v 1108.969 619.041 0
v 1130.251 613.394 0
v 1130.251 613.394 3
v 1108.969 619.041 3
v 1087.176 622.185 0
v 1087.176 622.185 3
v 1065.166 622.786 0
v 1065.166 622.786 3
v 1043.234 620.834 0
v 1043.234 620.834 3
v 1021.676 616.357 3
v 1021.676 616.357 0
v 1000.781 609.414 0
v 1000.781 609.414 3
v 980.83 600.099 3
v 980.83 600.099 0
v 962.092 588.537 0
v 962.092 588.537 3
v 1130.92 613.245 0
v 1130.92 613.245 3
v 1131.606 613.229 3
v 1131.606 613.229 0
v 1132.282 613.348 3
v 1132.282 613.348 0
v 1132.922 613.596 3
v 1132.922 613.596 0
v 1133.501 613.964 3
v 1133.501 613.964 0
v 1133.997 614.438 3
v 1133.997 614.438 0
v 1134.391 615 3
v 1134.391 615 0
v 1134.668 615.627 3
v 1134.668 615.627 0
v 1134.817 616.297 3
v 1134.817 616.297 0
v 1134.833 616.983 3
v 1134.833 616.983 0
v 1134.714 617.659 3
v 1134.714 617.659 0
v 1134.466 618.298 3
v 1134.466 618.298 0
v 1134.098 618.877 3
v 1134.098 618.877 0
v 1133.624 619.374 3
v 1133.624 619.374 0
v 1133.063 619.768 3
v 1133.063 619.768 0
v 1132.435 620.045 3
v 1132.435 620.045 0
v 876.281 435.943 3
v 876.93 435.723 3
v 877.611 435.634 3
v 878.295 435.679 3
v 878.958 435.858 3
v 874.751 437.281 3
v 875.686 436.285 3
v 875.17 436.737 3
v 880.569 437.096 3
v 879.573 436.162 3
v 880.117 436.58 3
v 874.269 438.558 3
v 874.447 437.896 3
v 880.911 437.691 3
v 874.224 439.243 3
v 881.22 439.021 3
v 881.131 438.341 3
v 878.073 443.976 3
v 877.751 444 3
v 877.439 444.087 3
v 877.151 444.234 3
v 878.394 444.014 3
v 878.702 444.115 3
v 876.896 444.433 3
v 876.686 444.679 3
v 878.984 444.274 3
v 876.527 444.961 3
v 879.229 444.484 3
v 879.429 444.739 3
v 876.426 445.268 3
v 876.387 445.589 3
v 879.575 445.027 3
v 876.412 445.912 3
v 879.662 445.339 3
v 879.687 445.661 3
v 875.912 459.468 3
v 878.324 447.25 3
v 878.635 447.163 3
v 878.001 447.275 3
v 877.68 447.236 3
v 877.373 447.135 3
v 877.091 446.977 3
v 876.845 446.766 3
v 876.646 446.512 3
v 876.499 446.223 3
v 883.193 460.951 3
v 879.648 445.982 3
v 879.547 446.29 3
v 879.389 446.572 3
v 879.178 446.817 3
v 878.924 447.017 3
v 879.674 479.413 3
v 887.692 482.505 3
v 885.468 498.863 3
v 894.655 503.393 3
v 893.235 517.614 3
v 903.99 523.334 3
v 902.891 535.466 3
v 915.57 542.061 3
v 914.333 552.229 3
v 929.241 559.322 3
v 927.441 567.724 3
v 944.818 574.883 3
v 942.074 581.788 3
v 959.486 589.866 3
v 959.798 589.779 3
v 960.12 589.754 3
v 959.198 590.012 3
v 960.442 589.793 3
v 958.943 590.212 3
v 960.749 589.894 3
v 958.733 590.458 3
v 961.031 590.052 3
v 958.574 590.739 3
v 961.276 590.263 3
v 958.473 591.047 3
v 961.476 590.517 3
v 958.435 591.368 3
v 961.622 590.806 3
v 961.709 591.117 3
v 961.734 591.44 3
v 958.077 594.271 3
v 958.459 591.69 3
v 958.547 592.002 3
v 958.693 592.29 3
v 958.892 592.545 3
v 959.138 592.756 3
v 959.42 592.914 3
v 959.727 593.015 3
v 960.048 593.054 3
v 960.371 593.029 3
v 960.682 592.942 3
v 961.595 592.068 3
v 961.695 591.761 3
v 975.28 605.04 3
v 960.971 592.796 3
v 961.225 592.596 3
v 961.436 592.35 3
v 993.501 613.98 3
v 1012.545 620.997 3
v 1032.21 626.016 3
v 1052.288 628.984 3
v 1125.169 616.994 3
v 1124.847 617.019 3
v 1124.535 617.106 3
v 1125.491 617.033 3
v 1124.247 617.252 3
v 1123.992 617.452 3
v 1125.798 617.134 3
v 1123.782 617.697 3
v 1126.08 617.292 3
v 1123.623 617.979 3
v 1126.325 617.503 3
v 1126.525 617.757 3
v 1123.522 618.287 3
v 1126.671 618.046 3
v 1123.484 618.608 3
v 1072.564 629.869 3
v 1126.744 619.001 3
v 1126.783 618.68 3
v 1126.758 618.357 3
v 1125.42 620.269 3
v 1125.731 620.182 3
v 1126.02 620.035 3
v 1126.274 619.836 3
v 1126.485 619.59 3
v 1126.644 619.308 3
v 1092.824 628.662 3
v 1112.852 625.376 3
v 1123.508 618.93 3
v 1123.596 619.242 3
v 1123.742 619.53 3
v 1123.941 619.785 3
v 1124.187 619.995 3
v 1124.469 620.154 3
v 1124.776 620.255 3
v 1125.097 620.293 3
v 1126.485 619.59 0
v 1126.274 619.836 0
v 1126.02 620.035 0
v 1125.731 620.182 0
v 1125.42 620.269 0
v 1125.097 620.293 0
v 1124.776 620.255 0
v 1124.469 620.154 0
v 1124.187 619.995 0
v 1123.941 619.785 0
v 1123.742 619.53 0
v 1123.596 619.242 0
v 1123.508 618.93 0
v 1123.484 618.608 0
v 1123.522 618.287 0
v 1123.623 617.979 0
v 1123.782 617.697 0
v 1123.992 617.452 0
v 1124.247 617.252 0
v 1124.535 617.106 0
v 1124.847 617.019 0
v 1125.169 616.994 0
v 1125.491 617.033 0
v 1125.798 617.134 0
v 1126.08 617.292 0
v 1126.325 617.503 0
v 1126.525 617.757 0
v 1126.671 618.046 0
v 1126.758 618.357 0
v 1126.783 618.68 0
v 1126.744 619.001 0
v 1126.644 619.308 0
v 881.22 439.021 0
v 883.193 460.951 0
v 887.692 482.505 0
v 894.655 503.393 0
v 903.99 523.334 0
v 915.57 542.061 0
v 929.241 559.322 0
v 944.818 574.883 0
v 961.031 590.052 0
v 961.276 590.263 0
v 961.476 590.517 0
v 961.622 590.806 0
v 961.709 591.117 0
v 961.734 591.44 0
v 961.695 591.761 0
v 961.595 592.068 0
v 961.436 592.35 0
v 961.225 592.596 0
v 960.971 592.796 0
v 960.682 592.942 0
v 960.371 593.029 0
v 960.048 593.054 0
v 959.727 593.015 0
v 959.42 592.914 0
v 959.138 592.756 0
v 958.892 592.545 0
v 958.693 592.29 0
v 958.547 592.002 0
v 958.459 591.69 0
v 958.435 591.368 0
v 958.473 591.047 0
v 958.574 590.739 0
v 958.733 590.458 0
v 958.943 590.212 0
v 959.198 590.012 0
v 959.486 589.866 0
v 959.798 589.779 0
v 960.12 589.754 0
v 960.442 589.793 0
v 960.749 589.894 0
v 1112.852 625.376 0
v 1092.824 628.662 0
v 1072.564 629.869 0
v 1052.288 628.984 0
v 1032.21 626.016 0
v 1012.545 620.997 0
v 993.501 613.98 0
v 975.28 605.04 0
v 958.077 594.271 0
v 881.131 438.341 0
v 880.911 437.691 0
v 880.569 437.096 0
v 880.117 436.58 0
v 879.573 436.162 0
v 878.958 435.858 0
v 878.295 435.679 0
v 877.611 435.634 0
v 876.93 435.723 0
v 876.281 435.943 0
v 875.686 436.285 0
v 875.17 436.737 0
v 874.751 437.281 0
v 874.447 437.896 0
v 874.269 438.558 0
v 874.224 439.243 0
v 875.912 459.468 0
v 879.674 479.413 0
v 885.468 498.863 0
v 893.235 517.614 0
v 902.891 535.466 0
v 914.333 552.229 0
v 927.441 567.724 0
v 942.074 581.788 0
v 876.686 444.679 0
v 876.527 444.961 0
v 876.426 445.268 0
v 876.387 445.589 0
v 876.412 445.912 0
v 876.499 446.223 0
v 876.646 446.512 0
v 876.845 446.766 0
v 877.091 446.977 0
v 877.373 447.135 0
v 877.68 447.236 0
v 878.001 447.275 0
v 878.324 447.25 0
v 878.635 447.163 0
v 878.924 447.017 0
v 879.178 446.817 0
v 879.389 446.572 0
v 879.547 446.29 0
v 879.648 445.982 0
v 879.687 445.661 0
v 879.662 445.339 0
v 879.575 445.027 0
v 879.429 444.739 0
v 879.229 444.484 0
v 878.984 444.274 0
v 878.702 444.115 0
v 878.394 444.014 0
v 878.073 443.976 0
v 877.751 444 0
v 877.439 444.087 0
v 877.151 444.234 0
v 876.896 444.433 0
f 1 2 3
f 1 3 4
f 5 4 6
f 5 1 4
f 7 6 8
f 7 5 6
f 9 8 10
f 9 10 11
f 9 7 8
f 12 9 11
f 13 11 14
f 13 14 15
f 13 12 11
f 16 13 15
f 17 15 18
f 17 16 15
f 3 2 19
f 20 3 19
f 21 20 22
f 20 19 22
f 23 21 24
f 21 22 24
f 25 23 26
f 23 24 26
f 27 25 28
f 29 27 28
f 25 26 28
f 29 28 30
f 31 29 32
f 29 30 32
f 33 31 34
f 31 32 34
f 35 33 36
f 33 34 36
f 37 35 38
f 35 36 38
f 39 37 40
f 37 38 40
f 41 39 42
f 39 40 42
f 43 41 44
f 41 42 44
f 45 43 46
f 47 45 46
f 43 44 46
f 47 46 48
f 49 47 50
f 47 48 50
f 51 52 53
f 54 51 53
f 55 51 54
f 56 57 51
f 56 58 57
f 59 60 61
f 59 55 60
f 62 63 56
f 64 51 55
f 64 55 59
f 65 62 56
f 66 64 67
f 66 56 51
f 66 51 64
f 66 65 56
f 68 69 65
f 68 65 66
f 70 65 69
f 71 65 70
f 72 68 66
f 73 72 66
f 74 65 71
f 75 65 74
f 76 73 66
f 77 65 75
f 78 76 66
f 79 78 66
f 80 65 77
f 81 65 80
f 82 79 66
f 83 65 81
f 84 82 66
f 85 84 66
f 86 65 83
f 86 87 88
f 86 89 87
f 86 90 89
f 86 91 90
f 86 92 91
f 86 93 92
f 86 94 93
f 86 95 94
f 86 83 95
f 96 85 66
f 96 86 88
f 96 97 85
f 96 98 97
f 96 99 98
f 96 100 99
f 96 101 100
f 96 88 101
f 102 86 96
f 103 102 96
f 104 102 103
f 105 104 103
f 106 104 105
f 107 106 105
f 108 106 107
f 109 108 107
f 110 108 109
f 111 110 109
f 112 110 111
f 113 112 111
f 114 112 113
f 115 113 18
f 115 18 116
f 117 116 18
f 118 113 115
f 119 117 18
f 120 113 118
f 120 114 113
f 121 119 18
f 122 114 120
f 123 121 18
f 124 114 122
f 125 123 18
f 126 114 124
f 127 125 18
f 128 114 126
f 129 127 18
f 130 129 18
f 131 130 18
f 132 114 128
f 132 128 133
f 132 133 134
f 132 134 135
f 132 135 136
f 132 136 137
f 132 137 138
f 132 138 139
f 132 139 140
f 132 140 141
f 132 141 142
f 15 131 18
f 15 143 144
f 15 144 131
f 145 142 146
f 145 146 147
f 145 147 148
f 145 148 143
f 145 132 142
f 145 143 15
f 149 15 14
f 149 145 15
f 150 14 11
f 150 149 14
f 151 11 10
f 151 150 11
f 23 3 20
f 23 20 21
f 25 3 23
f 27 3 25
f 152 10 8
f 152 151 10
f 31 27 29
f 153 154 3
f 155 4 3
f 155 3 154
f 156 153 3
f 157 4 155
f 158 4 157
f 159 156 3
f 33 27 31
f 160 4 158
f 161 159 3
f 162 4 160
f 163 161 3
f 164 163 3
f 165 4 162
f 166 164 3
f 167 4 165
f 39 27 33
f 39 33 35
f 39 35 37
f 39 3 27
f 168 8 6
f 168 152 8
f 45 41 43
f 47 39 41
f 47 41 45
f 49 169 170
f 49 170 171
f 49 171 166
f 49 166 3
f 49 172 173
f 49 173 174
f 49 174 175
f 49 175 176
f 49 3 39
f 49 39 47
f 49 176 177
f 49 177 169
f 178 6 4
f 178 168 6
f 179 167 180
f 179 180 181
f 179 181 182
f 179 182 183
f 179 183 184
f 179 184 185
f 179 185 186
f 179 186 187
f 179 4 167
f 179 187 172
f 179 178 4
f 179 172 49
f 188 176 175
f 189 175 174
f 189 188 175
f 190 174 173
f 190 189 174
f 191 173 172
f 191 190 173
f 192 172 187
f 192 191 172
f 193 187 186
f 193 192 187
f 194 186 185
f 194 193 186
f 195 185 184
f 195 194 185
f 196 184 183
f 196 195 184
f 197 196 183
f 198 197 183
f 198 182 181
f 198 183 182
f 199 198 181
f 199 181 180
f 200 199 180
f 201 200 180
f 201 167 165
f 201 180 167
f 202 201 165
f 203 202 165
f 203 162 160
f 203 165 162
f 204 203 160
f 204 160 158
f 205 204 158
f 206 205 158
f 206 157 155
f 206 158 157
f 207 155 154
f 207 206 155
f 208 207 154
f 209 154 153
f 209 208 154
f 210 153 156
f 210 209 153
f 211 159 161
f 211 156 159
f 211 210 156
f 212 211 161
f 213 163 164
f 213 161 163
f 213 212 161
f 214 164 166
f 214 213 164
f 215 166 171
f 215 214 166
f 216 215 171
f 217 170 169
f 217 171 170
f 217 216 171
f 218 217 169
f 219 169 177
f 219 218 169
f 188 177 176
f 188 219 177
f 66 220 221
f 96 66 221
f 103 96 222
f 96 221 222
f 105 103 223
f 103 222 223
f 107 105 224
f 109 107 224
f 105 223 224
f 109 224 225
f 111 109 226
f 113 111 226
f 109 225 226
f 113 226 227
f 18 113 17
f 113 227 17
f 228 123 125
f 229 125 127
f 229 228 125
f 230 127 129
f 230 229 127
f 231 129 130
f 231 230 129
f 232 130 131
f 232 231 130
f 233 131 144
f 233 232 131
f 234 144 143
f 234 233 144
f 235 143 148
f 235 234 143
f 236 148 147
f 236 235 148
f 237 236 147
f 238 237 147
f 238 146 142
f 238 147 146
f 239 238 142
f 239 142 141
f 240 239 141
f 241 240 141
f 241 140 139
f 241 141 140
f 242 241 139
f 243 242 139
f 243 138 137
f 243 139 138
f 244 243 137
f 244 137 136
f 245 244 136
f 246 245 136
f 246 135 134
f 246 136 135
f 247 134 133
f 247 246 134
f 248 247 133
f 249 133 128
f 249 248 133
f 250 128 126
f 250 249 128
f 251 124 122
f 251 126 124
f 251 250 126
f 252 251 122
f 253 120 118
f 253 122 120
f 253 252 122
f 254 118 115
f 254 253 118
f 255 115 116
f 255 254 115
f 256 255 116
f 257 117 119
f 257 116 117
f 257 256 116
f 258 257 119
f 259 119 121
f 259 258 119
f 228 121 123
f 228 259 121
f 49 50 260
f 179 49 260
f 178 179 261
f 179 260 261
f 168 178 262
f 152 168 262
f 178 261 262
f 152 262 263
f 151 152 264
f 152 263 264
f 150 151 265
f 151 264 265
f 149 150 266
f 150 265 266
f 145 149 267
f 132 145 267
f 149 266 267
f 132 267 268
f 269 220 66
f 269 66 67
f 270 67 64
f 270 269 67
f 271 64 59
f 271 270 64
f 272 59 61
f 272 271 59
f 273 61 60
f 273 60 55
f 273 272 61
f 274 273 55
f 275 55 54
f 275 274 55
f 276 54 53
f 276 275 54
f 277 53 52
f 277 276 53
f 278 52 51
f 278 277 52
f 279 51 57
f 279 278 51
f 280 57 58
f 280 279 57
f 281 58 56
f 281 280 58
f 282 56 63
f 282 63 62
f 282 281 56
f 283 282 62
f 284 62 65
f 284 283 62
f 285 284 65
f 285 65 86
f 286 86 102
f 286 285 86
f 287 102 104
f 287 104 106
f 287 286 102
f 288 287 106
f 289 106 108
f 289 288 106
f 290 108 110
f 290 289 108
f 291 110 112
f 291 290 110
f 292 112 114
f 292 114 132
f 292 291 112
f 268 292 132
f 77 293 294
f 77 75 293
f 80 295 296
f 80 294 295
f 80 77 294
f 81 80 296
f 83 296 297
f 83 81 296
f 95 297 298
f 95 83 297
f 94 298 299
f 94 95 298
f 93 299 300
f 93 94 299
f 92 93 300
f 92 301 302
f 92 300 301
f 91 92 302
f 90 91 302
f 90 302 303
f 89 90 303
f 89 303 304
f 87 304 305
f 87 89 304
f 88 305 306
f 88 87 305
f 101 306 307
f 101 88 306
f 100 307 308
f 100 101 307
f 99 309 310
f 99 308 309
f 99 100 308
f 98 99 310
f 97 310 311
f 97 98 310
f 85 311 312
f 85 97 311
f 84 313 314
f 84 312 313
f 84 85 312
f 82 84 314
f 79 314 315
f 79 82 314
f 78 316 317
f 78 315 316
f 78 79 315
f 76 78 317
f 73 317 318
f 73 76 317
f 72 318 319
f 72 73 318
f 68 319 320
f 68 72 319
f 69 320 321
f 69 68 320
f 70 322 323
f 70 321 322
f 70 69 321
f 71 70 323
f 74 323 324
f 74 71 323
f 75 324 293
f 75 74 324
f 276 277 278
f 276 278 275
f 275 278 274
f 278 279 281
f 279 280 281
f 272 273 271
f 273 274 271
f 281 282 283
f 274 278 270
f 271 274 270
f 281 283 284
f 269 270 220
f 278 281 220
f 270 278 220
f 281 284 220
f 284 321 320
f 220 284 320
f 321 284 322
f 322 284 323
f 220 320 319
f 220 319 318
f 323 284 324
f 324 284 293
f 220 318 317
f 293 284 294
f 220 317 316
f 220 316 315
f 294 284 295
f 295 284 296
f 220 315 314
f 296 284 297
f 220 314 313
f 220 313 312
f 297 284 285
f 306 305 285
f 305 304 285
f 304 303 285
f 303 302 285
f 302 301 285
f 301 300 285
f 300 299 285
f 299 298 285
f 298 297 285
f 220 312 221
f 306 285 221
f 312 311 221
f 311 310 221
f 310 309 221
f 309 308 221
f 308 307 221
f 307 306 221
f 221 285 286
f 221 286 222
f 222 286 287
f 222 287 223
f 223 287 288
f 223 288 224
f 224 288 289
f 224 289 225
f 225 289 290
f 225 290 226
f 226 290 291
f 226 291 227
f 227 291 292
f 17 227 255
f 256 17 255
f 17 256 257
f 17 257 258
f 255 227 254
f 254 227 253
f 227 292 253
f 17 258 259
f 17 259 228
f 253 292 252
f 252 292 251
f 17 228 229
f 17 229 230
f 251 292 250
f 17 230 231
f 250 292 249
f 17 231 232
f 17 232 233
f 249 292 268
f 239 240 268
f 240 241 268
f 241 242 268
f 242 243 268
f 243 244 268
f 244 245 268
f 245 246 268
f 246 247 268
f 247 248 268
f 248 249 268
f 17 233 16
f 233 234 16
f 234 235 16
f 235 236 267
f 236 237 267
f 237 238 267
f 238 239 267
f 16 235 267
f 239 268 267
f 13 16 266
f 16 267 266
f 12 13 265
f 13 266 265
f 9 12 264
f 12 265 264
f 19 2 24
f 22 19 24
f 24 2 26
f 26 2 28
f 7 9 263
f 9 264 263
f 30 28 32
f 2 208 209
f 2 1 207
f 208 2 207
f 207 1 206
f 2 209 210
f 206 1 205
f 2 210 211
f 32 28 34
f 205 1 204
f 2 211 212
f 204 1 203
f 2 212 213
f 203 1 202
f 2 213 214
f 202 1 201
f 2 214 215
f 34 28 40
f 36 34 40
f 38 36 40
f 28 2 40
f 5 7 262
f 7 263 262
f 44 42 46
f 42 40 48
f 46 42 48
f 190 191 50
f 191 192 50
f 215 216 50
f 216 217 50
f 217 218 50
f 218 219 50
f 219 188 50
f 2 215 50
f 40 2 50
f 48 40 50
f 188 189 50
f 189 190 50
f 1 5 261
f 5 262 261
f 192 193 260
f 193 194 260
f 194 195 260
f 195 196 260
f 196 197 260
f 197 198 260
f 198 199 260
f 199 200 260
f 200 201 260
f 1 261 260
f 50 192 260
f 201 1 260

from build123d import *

# Parameters (mm, degrees)
PAD015_DEPTH                        = 3
SKETCH054_R                         = 1.65
POCKET018_DEPTH                     = 358.938883
POCKET018_DEPTH_BACK                = 361.938883
BODY001003005003004_PLACEMENT_ANGLE = 60
CLONE007_PLACEMENT_ANGLE            = 25


with BuildPart() as part:
    # Sketch053 → Pad015 (new body)
    with BuildSketch(Plane.XY):
        with BuildLine():
            ThreePointArc((152.005097, 113.785532), (84.992984, 169.790723), (0, 189.875477))
            Line((0, 189.875477), (0, 196.875477))
            ThreePointArc((157.608957, 117.98038), (88.126358, 176.050273), (0, 196.875477))
            ThreePointArc((152.005097, 113.785532), (156.904451, 113.081026), (157.608957, 117.98038))
        make_face()
    pad015 = extrude(amount=PAD015_DEPTH)

    # Sketch054 → Pocket018 (cut, two sides)
    with BuildSketch(Plane.XY) as pocket018_sk:
        with Locations((150.82443, 121.020933)):
            Circle(SKETCH054_R)
        with BuildLine():
            ThreePointArc((0, 191.725477), (1.65, 193.375477), (0, 195.025477))
            Line((0, 191.725477), (0, 195.025477))
        make_face()
    pocket018 = extrude(amount=-POCKET018_DEPTH, mode=Mode.SUBTRACT) + extrude(pocket018_sk.sketch, amount=POCKET018_DEPTH_BACK, mode=Mode.SUBTRACT)

    # Mirrored020: Pad015, Pocket018 across Sketch053 V_Axis
    add(pad015.mirror(Plane(origin=(0, 0, 0), x_dir=(0, 0, 1), z_dir=(1, 0, 0))))
    add(pocket018.mirror(Plane(origin=(0, 0, 0), x_dir=(0, 0, 1), z_dir=(1, 0, 0))), mode=Mode.SUBTRACT)


with BuildPart() as part_1:
    # Body001003005003004 placement: moved
    add(part.part.rotate(Axis((0, 0, 0), (0, 0, 1)), BODY001003005003004_PLACEMENT_ANGLE))


with BuildPart() as part_2:
    # Clone007 placement: moved
    add(part_1.part.moved(Location((1071, 433, 0))).rotate(Axis((1071, 433, 0), (0, 0, -1)), CLONE007_PLACEMENT_ANGLE))


solid = part_2.part
